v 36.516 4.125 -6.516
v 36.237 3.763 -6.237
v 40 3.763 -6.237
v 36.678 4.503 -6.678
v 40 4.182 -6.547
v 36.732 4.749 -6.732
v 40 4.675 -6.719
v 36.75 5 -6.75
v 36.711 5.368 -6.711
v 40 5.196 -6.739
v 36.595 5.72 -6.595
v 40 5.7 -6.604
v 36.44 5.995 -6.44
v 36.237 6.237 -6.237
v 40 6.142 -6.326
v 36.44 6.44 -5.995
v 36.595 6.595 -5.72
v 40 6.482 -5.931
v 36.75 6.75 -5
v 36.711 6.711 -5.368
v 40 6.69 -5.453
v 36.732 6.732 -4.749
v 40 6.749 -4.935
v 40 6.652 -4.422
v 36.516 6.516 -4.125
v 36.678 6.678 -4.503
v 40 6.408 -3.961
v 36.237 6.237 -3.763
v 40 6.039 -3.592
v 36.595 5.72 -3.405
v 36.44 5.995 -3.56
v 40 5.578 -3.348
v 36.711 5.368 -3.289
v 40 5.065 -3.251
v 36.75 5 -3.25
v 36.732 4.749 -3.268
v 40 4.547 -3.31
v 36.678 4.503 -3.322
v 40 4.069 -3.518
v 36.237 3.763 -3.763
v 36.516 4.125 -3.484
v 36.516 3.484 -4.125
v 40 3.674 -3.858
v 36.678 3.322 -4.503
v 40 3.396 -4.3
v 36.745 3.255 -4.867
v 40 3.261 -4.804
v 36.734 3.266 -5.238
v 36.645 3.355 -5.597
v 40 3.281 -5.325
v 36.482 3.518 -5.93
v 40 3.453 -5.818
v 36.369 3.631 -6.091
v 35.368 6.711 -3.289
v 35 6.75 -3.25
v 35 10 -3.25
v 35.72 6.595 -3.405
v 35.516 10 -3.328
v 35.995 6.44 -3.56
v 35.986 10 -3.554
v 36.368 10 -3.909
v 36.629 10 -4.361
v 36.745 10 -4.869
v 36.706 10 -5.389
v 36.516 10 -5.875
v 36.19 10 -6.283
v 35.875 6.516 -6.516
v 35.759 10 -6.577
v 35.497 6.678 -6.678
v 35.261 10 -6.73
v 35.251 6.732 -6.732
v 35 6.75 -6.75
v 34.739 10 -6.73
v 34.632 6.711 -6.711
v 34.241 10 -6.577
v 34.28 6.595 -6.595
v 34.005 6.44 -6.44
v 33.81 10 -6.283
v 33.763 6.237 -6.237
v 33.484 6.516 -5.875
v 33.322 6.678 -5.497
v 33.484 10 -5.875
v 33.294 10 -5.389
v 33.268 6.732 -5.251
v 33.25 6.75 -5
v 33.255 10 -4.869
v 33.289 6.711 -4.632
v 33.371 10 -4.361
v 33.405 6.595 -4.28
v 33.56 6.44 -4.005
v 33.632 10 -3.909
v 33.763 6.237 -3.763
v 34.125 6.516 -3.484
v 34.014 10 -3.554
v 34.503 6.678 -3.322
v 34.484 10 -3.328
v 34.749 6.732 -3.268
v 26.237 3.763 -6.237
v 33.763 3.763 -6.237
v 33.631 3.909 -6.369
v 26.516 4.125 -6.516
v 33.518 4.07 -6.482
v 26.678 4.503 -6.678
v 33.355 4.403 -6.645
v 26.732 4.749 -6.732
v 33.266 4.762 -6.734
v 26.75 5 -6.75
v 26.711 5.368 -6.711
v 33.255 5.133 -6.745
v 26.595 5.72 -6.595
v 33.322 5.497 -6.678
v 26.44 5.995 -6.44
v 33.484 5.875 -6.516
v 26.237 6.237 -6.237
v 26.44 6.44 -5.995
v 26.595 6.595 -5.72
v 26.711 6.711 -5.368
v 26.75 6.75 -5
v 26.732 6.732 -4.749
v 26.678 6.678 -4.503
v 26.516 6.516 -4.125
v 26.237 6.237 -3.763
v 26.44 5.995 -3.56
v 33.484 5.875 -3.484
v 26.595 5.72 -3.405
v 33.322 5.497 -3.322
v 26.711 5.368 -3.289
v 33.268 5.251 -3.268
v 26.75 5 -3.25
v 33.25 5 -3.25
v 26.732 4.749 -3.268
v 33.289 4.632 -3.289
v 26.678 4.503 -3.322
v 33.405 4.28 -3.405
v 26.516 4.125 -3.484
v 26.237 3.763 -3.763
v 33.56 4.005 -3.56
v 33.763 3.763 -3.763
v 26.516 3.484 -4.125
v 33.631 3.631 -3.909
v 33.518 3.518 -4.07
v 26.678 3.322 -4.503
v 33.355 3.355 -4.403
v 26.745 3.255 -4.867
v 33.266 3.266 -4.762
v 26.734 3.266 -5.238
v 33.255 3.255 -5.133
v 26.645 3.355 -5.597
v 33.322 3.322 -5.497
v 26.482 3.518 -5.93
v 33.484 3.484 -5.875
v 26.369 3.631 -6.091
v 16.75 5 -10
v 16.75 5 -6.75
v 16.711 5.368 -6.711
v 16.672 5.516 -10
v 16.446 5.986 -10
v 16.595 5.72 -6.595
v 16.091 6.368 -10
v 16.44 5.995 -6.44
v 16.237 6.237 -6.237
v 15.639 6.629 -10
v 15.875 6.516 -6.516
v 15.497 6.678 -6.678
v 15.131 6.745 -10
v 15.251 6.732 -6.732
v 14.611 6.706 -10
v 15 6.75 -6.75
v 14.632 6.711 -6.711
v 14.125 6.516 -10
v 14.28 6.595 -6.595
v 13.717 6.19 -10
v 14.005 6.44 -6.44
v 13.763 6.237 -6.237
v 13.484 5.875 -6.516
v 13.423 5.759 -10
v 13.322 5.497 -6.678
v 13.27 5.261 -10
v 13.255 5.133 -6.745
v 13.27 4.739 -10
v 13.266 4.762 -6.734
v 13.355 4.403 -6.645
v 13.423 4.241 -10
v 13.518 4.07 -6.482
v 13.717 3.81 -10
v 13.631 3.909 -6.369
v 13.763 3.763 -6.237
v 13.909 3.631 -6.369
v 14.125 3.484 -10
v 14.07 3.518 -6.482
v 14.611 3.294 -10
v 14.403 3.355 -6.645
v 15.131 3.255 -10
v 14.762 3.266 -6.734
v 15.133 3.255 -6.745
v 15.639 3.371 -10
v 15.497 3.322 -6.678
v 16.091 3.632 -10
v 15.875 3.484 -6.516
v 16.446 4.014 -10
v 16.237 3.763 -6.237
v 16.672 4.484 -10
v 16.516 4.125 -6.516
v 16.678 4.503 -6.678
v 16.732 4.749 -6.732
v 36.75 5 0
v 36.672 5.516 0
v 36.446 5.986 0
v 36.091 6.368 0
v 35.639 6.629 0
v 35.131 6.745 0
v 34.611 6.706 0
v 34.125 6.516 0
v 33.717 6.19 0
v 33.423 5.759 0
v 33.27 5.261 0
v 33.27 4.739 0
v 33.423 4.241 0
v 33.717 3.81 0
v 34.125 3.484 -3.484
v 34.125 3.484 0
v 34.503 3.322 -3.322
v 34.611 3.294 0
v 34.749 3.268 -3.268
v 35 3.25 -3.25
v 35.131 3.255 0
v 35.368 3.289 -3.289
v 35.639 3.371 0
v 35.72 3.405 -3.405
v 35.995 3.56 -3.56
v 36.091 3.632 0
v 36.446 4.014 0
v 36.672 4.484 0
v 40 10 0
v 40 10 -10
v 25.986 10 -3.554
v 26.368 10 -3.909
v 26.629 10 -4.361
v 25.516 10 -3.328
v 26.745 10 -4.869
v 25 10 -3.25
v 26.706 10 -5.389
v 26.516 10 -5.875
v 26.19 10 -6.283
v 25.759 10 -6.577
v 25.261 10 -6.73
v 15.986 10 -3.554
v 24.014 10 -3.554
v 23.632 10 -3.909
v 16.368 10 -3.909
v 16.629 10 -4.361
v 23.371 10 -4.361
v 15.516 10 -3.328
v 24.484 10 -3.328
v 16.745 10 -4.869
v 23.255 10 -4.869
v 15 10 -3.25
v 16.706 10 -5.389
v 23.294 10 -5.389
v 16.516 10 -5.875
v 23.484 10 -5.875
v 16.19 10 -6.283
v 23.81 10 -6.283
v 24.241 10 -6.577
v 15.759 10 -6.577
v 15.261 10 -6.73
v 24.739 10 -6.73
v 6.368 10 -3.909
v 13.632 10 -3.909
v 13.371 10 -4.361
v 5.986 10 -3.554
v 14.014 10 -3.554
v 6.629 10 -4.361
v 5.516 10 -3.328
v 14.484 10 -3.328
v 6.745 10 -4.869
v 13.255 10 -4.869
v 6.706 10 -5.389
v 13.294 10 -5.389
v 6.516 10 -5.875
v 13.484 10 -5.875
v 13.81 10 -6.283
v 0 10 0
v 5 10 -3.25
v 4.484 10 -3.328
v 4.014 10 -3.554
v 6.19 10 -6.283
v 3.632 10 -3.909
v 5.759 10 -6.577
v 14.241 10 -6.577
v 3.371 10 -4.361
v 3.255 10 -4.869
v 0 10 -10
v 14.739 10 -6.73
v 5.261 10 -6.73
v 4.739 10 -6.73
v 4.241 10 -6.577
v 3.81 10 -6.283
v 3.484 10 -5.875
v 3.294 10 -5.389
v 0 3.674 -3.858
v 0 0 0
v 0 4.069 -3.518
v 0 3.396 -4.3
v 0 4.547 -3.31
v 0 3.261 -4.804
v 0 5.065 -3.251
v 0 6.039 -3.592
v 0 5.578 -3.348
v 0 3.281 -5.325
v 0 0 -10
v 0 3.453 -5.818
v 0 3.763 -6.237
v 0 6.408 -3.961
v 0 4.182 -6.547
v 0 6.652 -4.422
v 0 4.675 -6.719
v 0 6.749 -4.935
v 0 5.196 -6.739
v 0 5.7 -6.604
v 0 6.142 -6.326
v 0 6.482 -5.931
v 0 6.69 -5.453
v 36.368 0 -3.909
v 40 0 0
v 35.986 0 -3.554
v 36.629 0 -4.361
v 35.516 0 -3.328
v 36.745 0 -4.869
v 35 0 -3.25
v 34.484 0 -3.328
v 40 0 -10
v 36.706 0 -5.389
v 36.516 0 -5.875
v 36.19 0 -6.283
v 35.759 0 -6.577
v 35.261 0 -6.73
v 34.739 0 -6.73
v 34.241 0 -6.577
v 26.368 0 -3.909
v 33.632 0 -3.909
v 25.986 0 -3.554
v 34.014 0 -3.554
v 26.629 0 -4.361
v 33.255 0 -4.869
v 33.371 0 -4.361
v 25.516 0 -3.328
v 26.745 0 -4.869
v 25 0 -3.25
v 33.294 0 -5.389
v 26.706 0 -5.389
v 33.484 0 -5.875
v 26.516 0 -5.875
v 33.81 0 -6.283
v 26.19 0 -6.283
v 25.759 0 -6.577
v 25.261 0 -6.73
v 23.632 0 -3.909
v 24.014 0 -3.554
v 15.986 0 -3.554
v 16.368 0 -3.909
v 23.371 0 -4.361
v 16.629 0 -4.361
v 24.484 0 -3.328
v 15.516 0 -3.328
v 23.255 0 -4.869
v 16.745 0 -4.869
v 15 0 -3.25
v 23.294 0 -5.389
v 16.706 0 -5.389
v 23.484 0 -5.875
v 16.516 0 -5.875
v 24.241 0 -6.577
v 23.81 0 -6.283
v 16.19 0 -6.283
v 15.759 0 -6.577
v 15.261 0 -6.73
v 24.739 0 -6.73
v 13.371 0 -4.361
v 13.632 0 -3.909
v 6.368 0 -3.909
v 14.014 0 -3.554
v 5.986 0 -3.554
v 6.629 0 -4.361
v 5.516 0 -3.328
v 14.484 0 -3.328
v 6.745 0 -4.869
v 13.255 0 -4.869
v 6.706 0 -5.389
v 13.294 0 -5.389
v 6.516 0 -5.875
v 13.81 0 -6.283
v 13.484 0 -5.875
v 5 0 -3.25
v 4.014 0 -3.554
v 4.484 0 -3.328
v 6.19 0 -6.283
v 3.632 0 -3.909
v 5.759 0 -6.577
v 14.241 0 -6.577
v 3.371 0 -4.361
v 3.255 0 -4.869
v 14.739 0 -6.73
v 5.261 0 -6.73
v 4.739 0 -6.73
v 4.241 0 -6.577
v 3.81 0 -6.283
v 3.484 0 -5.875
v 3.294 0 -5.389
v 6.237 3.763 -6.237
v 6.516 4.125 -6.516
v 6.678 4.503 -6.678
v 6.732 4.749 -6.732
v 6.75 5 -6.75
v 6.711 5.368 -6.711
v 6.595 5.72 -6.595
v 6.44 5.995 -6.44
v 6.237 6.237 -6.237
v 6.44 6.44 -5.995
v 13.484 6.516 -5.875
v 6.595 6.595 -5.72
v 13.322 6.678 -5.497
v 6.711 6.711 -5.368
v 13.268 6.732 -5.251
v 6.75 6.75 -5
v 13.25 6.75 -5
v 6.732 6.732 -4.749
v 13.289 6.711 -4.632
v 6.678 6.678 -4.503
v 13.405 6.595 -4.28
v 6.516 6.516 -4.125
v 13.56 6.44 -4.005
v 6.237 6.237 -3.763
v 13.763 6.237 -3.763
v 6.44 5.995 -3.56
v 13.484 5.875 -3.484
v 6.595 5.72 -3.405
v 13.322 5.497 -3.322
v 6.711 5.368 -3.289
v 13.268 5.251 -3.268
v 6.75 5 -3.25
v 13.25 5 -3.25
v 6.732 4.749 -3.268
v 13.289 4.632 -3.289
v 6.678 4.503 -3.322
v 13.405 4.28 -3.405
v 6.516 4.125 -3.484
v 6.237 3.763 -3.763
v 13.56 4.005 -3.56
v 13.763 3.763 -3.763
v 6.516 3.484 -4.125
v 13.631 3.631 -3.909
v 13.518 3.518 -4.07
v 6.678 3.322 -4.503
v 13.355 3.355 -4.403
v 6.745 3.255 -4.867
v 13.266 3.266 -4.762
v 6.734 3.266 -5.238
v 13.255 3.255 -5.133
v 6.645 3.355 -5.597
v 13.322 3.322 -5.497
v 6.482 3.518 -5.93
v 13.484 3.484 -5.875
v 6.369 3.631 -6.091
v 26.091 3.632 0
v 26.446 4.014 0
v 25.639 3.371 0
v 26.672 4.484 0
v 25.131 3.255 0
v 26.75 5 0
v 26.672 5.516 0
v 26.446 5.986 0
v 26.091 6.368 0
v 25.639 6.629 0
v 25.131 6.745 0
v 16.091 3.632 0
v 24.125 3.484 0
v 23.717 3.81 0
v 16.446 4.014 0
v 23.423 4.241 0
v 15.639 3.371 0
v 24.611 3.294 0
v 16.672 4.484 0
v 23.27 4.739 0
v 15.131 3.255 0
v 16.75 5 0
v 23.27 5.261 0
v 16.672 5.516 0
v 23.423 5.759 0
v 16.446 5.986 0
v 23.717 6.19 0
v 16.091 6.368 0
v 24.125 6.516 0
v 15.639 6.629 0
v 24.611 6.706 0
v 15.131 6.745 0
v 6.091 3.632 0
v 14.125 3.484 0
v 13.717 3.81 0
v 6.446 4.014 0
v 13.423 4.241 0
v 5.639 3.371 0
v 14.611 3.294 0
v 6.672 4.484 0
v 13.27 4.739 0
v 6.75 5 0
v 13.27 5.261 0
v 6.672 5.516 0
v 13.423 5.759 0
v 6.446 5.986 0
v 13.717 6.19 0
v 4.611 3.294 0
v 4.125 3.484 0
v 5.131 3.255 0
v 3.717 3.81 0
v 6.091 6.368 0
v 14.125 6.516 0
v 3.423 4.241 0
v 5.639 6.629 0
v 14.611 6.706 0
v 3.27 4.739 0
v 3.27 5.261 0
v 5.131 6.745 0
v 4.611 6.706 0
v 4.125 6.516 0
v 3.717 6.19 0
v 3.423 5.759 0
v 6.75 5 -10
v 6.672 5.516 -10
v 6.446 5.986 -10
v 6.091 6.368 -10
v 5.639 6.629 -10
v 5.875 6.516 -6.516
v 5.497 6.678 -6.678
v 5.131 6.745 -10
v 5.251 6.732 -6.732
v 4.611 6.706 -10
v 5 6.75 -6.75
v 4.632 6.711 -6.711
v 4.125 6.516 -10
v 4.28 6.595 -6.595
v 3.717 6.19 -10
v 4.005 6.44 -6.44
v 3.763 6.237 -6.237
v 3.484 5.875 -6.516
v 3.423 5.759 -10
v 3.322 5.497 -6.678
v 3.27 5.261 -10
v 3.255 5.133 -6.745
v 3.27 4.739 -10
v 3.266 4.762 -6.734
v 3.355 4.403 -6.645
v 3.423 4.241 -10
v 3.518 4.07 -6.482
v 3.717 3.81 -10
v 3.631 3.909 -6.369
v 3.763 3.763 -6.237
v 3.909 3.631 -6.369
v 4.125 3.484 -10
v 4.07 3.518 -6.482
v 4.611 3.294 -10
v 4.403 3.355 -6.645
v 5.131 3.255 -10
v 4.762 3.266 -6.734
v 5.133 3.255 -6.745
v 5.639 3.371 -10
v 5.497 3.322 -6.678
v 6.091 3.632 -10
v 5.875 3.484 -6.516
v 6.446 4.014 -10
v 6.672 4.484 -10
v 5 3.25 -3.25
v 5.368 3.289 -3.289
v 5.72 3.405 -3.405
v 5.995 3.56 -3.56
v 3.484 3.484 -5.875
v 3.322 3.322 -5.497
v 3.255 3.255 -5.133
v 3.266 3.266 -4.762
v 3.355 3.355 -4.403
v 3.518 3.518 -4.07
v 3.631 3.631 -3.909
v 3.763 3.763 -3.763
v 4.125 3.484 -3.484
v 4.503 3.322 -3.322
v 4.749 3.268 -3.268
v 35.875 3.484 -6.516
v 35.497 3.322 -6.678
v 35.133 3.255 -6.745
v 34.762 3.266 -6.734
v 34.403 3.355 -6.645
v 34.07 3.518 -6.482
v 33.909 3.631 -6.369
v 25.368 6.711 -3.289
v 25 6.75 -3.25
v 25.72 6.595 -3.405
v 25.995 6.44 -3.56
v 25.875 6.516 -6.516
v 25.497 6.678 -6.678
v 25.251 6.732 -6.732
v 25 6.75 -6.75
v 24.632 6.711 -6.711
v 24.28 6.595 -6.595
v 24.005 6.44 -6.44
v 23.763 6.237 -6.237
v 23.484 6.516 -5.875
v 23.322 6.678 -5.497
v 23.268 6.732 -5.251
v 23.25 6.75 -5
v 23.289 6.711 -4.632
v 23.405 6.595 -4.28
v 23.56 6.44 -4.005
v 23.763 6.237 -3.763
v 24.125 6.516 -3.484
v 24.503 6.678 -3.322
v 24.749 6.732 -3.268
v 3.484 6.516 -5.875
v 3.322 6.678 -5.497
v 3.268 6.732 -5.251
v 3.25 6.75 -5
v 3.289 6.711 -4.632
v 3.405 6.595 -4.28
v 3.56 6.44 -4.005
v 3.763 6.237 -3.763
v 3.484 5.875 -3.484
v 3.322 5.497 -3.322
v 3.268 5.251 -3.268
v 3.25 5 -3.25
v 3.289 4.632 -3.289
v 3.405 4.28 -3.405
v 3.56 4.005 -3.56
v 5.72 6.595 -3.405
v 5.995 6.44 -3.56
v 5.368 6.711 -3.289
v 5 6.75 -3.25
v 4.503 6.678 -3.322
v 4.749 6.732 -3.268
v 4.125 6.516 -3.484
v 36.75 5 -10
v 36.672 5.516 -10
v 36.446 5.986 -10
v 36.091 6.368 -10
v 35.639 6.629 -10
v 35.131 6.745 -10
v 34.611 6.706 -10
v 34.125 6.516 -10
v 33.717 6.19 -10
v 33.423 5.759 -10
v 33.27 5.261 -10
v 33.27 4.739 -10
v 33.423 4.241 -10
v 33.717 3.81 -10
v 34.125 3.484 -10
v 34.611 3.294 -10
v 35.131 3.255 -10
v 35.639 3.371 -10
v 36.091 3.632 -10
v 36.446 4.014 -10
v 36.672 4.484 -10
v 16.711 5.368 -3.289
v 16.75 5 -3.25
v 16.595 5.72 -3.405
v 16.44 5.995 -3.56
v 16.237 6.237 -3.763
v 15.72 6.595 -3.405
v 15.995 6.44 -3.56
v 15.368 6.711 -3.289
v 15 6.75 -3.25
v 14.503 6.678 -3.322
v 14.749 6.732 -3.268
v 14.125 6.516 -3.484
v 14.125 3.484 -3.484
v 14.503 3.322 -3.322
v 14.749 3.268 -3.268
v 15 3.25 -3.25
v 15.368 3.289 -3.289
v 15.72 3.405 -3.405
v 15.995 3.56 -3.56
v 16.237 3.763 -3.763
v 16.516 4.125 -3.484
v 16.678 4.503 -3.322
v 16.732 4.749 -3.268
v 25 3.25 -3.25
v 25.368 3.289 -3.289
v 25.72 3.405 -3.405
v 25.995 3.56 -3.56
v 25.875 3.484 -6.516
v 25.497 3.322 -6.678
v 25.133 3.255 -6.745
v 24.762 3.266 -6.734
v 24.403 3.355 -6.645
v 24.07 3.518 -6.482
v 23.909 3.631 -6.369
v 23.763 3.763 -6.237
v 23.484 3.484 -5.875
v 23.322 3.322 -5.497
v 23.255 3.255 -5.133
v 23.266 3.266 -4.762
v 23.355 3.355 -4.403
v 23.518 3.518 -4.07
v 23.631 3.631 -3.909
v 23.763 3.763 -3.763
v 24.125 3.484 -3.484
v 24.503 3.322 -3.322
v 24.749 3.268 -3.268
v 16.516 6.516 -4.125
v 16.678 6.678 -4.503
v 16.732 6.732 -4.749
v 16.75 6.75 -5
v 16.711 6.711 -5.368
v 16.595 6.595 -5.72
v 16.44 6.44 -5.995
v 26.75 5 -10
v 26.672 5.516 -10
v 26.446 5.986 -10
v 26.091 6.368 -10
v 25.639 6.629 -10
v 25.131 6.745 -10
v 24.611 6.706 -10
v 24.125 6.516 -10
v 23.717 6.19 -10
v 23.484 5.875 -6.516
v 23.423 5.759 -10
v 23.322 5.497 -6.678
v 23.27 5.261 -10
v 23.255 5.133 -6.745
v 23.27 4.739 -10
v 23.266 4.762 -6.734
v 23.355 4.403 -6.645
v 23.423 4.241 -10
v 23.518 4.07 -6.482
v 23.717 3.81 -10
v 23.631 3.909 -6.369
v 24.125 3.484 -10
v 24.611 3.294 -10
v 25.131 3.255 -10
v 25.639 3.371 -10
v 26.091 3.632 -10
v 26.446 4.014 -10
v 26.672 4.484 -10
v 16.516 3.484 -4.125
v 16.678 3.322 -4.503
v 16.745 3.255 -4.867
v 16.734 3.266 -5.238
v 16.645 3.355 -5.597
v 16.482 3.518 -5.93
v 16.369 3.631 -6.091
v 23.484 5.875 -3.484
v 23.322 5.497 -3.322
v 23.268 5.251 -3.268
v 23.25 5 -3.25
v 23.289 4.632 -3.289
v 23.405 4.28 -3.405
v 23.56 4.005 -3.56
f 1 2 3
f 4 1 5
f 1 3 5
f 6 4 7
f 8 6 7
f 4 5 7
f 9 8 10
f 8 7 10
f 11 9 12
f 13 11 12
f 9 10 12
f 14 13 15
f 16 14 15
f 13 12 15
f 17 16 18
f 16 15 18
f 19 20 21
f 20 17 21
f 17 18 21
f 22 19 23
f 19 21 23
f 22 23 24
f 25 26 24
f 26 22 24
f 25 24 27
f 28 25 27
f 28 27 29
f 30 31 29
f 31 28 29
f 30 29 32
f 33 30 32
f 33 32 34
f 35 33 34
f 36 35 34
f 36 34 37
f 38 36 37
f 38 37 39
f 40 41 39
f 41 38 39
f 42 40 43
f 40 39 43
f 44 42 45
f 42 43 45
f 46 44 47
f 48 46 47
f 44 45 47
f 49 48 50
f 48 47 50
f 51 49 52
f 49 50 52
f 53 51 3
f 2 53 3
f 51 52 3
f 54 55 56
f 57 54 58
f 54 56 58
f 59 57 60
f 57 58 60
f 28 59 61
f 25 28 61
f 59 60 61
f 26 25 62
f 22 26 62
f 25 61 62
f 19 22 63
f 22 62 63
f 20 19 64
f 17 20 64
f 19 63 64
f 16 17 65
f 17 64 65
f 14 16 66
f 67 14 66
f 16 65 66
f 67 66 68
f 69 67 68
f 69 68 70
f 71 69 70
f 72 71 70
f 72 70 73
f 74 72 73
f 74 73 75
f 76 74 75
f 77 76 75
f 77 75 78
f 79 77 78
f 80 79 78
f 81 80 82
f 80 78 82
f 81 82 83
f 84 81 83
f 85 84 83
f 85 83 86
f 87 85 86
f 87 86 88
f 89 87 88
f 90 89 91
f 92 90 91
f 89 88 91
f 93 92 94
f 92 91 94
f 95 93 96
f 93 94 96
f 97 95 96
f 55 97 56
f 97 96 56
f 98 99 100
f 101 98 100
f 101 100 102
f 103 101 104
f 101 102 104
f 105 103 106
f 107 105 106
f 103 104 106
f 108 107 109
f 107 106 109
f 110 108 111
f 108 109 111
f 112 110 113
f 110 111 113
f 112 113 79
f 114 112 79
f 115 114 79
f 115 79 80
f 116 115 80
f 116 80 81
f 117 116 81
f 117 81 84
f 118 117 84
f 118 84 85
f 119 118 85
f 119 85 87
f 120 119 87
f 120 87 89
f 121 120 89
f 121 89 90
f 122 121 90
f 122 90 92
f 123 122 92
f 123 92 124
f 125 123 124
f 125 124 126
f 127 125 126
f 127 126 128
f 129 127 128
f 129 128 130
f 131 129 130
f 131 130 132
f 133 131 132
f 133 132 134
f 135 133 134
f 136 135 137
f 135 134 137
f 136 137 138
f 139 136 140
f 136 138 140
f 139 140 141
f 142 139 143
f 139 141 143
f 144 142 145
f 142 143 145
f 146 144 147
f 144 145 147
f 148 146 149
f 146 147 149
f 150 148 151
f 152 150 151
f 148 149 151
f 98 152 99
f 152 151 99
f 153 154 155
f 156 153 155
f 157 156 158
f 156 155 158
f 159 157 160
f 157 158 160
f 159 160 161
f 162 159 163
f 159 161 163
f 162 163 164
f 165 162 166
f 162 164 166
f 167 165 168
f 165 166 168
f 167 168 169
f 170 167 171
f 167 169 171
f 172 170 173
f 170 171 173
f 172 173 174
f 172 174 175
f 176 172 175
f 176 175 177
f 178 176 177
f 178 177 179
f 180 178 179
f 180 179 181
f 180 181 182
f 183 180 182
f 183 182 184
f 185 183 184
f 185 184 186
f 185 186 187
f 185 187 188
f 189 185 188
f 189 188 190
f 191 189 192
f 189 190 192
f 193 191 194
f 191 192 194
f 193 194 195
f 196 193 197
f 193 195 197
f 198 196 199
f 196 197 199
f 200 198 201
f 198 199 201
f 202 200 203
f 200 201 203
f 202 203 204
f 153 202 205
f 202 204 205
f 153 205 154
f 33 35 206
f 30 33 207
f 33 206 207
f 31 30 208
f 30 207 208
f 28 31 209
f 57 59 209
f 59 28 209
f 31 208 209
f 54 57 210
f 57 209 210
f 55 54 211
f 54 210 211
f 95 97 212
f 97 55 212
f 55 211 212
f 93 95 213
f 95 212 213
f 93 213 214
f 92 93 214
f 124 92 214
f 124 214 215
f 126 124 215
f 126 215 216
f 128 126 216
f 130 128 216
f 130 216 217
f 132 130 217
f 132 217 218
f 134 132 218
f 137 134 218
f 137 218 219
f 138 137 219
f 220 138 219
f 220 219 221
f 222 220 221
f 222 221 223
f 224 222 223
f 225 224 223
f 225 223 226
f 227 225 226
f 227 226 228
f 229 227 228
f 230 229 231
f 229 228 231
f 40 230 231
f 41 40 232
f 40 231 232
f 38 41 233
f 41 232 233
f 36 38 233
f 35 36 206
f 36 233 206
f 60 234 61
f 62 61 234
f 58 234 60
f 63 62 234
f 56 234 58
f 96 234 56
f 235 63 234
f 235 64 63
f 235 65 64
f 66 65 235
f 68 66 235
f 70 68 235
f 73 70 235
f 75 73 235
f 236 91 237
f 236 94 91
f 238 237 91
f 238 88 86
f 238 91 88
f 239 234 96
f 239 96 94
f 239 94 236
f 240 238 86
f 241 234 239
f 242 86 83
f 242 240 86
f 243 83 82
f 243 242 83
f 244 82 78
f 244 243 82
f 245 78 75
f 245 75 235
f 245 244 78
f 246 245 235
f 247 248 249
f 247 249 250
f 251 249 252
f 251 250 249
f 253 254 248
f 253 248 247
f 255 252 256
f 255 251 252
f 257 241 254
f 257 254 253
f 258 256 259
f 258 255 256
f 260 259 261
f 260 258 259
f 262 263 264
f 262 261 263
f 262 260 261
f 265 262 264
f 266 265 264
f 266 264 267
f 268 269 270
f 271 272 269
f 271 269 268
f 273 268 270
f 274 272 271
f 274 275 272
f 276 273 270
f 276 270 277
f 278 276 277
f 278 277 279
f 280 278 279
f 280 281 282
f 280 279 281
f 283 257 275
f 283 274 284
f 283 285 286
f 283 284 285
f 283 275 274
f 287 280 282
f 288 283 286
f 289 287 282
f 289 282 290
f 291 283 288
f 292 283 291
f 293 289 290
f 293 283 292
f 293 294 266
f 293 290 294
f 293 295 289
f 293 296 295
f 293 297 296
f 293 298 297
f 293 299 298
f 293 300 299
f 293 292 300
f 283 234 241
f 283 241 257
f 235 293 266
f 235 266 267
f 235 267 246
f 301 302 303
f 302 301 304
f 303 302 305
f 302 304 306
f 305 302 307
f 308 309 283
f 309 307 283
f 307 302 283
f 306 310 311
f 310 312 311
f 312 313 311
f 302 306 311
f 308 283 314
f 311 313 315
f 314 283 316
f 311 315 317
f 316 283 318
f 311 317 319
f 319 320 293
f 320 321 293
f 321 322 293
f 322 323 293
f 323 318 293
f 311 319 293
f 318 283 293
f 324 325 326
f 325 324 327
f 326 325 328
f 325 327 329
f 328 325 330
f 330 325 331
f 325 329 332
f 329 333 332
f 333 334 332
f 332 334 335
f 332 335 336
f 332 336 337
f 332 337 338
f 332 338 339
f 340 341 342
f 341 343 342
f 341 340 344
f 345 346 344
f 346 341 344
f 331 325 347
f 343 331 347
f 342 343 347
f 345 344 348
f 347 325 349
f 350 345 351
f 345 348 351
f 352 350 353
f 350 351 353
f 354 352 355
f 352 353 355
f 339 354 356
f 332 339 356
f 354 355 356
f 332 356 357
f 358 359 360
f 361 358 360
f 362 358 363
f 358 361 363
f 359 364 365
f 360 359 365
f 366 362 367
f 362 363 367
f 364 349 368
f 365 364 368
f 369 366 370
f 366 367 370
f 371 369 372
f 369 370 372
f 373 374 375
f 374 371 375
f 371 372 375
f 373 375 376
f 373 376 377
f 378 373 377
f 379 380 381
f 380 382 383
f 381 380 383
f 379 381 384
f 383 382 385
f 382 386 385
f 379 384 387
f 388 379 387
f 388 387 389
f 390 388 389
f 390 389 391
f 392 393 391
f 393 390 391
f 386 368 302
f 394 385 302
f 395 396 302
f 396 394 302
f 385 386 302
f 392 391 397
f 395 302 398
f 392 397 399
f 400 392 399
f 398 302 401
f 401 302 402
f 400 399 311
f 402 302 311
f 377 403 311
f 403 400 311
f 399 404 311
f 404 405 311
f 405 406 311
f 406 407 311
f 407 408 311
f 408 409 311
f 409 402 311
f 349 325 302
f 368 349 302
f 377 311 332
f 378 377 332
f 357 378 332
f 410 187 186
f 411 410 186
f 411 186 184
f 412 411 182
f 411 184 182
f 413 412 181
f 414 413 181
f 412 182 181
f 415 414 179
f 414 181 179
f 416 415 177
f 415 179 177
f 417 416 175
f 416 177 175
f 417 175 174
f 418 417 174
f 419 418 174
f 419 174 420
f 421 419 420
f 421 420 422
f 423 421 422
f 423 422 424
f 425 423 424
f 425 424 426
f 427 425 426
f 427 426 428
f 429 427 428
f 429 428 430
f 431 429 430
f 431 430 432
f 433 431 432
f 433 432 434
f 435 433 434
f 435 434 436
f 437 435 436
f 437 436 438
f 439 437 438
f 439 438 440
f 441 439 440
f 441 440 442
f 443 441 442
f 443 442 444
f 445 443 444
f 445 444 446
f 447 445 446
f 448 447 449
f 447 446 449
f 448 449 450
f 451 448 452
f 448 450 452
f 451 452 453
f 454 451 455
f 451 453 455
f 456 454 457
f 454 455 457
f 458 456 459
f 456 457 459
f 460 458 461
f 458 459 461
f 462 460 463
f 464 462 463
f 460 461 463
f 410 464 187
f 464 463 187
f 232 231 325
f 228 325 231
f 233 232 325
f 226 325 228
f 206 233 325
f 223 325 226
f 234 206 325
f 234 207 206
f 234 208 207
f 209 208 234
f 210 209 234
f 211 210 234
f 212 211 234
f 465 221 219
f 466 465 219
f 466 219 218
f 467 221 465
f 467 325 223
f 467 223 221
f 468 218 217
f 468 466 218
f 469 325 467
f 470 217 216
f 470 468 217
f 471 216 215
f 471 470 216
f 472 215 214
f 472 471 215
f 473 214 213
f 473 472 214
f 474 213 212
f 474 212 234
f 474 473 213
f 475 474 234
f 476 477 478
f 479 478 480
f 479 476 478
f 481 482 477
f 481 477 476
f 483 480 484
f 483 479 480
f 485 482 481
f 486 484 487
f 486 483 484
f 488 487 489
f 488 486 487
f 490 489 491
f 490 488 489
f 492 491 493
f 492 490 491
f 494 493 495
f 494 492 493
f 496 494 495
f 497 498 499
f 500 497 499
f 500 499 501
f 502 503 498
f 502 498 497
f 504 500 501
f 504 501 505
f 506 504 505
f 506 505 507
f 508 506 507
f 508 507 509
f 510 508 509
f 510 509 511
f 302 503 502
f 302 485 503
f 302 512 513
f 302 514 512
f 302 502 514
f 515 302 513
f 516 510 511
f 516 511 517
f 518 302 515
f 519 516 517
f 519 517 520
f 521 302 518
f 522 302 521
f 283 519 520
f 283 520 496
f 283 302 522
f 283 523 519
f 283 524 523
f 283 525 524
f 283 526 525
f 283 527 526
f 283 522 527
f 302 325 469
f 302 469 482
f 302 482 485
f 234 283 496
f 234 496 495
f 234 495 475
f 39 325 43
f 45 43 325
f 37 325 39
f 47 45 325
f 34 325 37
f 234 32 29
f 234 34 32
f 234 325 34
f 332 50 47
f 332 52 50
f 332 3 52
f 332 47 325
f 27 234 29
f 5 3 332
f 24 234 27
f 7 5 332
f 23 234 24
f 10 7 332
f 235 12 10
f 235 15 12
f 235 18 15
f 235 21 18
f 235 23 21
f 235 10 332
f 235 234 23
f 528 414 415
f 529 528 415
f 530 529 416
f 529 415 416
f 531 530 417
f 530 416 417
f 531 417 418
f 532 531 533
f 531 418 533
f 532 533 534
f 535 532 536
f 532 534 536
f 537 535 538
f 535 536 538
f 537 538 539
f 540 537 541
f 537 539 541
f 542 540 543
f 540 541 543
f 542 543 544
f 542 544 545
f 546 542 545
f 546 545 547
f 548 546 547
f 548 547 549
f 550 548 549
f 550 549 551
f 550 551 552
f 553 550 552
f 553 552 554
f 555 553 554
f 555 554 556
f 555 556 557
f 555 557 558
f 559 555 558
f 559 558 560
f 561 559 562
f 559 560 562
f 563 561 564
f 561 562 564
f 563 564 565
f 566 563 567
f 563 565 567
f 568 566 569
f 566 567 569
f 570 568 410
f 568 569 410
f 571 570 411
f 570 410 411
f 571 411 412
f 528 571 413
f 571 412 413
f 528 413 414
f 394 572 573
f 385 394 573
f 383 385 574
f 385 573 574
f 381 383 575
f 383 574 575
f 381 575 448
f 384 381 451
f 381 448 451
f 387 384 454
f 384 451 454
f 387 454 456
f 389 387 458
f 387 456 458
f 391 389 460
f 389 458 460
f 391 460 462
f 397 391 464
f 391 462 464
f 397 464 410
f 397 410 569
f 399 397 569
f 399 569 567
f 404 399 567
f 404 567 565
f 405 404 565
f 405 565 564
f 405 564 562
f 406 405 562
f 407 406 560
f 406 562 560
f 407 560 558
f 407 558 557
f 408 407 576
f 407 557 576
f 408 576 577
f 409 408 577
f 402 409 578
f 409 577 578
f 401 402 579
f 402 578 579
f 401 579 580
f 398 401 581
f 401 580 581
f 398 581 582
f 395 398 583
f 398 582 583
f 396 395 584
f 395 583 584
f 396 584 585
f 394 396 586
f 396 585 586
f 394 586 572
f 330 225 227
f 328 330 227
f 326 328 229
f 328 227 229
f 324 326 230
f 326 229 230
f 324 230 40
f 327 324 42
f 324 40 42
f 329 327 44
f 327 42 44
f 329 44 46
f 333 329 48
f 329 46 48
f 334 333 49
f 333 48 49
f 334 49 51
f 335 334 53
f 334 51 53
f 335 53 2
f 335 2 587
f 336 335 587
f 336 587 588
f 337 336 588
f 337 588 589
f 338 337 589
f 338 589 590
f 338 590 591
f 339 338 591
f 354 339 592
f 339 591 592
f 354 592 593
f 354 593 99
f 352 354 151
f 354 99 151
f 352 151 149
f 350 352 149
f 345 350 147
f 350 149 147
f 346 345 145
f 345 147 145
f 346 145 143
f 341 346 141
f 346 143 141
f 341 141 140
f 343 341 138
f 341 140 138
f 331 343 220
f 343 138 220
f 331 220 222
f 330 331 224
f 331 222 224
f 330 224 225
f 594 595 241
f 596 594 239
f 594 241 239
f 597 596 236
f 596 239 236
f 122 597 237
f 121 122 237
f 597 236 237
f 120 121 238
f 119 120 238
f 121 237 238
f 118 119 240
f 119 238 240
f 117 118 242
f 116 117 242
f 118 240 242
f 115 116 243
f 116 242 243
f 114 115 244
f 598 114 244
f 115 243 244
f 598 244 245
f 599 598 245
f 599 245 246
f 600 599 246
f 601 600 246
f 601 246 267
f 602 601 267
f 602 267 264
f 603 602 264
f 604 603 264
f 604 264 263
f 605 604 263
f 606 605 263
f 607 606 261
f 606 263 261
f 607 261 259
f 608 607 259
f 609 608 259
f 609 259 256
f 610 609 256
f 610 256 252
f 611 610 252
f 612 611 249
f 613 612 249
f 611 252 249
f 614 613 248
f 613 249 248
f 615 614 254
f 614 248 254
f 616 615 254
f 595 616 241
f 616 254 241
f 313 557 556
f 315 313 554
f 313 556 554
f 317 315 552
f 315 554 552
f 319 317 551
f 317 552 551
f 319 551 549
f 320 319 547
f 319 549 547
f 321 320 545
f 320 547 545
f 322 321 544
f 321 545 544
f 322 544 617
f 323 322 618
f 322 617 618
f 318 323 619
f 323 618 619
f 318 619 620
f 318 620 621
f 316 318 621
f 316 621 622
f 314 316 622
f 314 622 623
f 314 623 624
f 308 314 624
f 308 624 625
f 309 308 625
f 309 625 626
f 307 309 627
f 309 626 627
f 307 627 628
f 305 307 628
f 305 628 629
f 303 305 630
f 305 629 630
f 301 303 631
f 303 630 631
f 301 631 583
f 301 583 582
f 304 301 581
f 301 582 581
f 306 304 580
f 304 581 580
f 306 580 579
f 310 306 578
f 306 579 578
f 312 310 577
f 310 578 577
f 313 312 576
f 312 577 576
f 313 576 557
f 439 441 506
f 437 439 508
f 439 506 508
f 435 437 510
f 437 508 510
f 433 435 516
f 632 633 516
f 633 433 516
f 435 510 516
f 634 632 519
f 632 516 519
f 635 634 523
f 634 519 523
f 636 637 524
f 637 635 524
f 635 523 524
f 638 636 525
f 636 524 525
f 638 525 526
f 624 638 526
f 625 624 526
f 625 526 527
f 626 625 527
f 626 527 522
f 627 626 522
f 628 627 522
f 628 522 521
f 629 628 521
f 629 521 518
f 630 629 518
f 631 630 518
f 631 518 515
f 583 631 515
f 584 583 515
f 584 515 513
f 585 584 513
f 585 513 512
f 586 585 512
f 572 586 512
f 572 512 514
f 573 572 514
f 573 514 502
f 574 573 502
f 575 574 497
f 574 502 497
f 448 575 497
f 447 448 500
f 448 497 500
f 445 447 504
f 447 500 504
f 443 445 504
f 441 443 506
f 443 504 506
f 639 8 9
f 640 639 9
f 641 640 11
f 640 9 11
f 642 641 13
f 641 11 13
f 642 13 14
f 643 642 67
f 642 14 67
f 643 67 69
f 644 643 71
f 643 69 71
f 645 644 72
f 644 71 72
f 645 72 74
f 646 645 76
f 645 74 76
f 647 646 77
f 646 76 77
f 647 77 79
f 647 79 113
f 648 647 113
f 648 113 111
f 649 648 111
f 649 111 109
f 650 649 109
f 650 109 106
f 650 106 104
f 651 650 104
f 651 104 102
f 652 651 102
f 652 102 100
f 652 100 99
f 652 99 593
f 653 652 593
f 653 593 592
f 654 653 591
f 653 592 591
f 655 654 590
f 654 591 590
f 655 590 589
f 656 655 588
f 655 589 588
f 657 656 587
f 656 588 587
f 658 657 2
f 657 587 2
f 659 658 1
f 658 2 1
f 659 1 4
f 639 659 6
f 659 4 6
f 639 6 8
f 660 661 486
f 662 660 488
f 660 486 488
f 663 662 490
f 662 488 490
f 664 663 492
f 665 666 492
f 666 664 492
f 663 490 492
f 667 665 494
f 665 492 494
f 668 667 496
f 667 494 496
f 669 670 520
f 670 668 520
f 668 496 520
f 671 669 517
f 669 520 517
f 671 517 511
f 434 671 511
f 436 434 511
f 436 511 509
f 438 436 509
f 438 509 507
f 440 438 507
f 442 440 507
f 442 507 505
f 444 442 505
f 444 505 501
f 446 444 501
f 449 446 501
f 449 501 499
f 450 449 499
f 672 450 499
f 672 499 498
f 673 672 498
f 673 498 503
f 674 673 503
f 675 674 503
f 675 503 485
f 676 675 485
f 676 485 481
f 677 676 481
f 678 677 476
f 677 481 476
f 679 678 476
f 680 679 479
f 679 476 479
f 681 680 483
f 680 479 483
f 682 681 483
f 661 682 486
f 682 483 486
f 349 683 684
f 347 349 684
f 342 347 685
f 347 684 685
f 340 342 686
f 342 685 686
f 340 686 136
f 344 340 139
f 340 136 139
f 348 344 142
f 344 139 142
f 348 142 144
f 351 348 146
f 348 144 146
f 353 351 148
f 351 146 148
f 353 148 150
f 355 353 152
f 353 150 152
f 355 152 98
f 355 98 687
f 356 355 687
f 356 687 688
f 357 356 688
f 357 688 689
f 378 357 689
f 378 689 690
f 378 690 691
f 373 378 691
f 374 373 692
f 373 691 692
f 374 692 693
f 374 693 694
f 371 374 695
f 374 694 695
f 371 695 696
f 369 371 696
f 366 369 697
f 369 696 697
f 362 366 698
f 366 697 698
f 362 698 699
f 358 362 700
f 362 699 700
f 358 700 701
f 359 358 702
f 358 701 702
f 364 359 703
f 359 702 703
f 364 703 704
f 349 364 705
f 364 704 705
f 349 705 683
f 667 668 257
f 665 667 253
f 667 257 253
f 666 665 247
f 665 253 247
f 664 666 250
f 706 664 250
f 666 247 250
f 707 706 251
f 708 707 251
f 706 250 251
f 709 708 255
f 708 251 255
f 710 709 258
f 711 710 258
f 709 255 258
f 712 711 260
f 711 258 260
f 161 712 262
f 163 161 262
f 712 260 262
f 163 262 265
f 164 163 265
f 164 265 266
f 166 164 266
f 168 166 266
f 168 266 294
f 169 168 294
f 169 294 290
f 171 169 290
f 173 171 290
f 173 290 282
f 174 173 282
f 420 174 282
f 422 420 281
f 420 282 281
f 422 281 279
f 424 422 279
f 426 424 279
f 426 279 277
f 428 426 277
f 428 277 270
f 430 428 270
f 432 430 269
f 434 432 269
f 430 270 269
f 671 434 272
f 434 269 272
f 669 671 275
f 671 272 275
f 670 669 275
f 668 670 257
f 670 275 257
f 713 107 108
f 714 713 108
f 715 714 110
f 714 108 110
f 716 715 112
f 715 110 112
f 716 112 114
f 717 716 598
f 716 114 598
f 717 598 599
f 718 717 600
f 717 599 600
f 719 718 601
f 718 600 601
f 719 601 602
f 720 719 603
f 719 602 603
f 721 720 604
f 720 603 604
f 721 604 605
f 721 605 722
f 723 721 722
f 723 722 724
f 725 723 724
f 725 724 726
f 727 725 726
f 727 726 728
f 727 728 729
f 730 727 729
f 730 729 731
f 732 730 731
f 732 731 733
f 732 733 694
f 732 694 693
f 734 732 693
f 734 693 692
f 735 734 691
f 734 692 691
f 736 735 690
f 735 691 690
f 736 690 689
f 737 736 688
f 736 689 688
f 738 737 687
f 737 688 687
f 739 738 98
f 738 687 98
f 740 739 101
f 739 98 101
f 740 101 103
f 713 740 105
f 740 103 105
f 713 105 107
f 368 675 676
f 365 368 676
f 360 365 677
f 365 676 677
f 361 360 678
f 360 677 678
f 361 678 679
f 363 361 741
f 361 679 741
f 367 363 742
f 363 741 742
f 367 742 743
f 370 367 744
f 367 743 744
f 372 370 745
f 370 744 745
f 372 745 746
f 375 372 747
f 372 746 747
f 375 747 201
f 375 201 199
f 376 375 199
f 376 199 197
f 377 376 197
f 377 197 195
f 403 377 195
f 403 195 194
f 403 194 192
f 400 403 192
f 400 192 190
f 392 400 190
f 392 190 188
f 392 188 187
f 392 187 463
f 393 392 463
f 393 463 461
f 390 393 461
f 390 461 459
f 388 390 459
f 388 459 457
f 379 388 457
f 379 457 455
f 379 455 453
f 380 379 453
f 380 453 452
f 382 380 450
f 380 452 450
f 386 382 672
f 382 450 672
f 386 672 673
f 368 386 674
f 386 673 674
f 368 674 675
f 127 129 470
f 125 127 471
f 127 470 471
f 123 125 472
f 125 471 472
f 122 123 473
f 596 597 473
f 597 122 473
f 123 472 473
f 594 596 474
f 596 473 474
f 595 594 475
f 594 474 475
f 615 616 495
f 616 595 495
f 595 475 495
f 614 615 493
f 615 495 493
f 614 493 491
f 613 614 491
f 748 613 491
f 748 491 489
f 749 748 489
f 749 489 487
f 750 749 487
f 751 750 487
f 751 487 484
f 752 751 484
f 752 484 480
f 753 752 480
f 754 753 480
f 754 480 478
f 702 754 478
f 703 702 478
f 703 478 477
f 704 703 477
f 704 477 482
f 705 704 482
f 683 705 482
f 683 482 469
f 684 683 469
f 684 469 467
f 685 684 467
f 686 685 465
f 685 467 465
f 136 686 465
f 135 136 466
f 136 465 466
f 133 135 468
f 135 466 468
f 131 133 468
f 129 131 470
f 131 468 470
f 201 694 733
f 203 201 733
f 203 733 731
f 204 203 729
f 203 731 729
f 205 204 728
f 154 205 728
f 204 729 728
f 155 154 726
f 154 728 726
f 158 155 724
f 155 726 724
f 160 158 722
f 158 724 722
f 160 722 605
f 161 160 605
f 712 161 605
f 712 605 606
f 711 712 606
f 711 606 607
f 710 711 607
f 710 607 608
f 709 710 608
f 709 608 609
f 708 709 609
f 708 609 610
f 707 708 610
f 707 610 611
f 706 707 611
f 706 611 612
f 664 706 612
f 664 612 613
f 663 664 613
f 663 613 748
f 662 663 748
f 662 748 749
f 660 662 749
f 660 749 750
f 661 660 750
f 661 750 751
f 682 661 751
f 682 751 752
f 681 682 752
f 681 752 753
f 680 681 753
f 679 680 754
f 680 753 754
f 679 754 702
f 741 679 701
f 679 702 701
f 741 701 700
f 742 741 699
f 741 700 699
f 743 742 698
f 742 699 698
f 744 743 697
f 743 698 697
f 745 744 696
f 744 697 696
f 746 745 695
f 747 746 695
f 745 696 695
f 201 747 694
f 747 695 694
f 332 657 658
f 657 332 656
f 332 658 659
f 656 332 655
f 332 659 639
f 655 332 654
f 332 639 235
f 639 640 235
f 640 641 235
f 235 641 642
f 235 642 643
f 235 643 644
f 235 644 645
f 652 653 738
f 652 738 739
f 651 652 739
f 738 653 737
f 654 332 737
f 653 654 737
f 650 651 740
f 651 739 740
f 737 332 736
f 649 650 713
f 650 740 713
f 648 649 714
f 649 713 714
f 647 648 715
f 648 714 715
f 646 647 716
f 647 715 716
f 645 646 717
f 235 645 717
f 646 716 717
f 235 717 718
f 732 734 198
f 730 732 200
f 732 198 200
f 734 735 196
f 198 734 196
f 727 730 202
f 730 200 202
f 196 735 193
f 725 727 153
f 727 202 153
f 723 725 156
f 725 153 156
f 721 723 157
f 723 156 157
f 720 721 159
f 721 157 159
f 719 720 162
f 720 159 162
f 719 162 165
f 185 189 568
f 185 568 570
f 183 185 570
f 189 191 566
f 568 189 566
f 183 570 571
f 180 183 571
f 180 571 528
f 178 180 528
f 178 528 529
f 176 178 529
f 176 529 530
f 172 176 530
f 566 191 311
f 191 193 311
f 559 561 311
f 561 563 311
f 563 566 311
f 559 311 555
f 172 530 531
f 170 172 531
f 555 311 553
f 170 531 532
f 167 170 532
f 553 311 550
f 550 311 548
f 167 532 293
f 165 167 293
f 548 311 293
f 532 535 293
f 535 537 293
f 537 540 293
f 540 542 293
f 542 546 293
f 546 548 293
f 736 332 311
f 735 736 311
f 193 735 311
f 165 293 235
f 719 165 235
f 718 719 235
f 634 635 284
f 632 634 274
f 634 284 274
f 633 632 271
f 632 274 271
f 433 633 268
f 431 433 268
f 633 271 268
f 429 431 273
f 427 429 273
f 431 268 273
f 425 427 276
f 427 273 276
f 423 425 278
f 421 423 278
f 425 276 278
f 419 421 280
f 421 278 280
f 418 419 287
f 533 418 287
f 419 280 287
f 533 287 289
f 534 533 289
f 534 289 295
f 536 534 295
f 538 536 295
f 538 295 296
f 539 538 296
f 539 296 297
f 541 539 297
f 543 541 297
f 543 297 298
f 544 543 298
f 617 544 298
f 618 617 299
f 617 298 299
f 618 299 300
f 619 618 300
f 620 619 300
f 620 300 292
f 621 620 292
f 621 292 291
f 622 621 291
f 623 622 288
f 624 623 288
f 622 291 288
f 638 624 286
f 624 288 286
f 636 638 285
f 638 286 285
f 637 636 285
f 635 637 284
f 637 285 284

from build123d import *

# Parameters (mm, degrees)
ESQUISSE1_W             = 10
ESQUISSE1_H             = 10
BOSS_EXTRU_1_DEPTH      = 40
ESQUISSE2_R             = 1.75
ENL_V_MAT_EXTRU_1_DEPTH = 43.426406871
ESQUISSE3_R             = 1.75
ENL_V_MAT_EXTRU_2_DEPTH = 40
ESQUISSE4_R             = 1.75
ENL_V_MAT_EXTRU_3_DEPTH = 40


with BuildPart() as part:
    # Esquisse1 → Boss.-Extru.1 (new body)
    with BuildSketch(Plane(origin=(0, 0, 0), x_dir=(0, 0, -1), z_dir=(1, 0, 0))):
        with Locations((5, 5)):
            Rectangle(ESQUISSE1_W, ESQUISSE1_H)
    extrude(amount=BOSS_EXTRU_1_DEPTH)

    # Esquisse2 → Enlèv. mat.-Extru.1 (cut, through all)
    with BuildSketch(Plane(origin=(0, 10, 0), x_dir=(1, 0, 0), z_dir=(0, 1, 0))):
        with Locations(Location((5, 5, 0), (0, 0, 270))):
            Circle(ESQUISSE2_R)
        with Locations(Location((15, 5, 0), (0, 0, 270))):
            Circle(ESQUISSE2_R)
        with Locations(Location((25, 5, 0), (0, 0, 270))):
            Circle(ESQUISSE2_R)
        with Locations(Location((35, 5, 0), (0, 0, 270))):
            Circle(ESQUISSE2_R)
    extrude(amount=-ENL_V_MAT_EXTRU_1_DEPTH, mode=Mode.SUBTRACT)

    # Esquisse3 → Enlèv. mat.-Extru.2 (cut)
    with BuildSketch(Plane.XY):
        with Locations((5, 5)):
            Circle(ESQUISSE3_R)
        with Locations((15, 5)):
            Circle(ESQUISSE3_R)
        with Locations((25, 5)):
            Circle(ESQUISSE3_R)
        with Locations((35, 5)):
            Circle(ESQUISSE3_R)
    extrude(amount=-ENL_V_MAT_EXTRU_2_DEPTH, mode=Mode.SUBTRACT)

    # Esquisse4 → Enlèv. mat.-Extru.3 (cut)
    with BuildSketch(Plane(origin=(40, 0, 0), x_dir=(0, 0, -1), z_dir=(1, 0, 0))):
        with Locations(Location((5, 5, 0), (0, 0, 315))):
            Circle(ESQUISSE4_R)
    extrude(amount=-ENL_V_MAT_EXTRU_3_DEPTH, mode=Mode.SUBTRACT)


solid = part.part
